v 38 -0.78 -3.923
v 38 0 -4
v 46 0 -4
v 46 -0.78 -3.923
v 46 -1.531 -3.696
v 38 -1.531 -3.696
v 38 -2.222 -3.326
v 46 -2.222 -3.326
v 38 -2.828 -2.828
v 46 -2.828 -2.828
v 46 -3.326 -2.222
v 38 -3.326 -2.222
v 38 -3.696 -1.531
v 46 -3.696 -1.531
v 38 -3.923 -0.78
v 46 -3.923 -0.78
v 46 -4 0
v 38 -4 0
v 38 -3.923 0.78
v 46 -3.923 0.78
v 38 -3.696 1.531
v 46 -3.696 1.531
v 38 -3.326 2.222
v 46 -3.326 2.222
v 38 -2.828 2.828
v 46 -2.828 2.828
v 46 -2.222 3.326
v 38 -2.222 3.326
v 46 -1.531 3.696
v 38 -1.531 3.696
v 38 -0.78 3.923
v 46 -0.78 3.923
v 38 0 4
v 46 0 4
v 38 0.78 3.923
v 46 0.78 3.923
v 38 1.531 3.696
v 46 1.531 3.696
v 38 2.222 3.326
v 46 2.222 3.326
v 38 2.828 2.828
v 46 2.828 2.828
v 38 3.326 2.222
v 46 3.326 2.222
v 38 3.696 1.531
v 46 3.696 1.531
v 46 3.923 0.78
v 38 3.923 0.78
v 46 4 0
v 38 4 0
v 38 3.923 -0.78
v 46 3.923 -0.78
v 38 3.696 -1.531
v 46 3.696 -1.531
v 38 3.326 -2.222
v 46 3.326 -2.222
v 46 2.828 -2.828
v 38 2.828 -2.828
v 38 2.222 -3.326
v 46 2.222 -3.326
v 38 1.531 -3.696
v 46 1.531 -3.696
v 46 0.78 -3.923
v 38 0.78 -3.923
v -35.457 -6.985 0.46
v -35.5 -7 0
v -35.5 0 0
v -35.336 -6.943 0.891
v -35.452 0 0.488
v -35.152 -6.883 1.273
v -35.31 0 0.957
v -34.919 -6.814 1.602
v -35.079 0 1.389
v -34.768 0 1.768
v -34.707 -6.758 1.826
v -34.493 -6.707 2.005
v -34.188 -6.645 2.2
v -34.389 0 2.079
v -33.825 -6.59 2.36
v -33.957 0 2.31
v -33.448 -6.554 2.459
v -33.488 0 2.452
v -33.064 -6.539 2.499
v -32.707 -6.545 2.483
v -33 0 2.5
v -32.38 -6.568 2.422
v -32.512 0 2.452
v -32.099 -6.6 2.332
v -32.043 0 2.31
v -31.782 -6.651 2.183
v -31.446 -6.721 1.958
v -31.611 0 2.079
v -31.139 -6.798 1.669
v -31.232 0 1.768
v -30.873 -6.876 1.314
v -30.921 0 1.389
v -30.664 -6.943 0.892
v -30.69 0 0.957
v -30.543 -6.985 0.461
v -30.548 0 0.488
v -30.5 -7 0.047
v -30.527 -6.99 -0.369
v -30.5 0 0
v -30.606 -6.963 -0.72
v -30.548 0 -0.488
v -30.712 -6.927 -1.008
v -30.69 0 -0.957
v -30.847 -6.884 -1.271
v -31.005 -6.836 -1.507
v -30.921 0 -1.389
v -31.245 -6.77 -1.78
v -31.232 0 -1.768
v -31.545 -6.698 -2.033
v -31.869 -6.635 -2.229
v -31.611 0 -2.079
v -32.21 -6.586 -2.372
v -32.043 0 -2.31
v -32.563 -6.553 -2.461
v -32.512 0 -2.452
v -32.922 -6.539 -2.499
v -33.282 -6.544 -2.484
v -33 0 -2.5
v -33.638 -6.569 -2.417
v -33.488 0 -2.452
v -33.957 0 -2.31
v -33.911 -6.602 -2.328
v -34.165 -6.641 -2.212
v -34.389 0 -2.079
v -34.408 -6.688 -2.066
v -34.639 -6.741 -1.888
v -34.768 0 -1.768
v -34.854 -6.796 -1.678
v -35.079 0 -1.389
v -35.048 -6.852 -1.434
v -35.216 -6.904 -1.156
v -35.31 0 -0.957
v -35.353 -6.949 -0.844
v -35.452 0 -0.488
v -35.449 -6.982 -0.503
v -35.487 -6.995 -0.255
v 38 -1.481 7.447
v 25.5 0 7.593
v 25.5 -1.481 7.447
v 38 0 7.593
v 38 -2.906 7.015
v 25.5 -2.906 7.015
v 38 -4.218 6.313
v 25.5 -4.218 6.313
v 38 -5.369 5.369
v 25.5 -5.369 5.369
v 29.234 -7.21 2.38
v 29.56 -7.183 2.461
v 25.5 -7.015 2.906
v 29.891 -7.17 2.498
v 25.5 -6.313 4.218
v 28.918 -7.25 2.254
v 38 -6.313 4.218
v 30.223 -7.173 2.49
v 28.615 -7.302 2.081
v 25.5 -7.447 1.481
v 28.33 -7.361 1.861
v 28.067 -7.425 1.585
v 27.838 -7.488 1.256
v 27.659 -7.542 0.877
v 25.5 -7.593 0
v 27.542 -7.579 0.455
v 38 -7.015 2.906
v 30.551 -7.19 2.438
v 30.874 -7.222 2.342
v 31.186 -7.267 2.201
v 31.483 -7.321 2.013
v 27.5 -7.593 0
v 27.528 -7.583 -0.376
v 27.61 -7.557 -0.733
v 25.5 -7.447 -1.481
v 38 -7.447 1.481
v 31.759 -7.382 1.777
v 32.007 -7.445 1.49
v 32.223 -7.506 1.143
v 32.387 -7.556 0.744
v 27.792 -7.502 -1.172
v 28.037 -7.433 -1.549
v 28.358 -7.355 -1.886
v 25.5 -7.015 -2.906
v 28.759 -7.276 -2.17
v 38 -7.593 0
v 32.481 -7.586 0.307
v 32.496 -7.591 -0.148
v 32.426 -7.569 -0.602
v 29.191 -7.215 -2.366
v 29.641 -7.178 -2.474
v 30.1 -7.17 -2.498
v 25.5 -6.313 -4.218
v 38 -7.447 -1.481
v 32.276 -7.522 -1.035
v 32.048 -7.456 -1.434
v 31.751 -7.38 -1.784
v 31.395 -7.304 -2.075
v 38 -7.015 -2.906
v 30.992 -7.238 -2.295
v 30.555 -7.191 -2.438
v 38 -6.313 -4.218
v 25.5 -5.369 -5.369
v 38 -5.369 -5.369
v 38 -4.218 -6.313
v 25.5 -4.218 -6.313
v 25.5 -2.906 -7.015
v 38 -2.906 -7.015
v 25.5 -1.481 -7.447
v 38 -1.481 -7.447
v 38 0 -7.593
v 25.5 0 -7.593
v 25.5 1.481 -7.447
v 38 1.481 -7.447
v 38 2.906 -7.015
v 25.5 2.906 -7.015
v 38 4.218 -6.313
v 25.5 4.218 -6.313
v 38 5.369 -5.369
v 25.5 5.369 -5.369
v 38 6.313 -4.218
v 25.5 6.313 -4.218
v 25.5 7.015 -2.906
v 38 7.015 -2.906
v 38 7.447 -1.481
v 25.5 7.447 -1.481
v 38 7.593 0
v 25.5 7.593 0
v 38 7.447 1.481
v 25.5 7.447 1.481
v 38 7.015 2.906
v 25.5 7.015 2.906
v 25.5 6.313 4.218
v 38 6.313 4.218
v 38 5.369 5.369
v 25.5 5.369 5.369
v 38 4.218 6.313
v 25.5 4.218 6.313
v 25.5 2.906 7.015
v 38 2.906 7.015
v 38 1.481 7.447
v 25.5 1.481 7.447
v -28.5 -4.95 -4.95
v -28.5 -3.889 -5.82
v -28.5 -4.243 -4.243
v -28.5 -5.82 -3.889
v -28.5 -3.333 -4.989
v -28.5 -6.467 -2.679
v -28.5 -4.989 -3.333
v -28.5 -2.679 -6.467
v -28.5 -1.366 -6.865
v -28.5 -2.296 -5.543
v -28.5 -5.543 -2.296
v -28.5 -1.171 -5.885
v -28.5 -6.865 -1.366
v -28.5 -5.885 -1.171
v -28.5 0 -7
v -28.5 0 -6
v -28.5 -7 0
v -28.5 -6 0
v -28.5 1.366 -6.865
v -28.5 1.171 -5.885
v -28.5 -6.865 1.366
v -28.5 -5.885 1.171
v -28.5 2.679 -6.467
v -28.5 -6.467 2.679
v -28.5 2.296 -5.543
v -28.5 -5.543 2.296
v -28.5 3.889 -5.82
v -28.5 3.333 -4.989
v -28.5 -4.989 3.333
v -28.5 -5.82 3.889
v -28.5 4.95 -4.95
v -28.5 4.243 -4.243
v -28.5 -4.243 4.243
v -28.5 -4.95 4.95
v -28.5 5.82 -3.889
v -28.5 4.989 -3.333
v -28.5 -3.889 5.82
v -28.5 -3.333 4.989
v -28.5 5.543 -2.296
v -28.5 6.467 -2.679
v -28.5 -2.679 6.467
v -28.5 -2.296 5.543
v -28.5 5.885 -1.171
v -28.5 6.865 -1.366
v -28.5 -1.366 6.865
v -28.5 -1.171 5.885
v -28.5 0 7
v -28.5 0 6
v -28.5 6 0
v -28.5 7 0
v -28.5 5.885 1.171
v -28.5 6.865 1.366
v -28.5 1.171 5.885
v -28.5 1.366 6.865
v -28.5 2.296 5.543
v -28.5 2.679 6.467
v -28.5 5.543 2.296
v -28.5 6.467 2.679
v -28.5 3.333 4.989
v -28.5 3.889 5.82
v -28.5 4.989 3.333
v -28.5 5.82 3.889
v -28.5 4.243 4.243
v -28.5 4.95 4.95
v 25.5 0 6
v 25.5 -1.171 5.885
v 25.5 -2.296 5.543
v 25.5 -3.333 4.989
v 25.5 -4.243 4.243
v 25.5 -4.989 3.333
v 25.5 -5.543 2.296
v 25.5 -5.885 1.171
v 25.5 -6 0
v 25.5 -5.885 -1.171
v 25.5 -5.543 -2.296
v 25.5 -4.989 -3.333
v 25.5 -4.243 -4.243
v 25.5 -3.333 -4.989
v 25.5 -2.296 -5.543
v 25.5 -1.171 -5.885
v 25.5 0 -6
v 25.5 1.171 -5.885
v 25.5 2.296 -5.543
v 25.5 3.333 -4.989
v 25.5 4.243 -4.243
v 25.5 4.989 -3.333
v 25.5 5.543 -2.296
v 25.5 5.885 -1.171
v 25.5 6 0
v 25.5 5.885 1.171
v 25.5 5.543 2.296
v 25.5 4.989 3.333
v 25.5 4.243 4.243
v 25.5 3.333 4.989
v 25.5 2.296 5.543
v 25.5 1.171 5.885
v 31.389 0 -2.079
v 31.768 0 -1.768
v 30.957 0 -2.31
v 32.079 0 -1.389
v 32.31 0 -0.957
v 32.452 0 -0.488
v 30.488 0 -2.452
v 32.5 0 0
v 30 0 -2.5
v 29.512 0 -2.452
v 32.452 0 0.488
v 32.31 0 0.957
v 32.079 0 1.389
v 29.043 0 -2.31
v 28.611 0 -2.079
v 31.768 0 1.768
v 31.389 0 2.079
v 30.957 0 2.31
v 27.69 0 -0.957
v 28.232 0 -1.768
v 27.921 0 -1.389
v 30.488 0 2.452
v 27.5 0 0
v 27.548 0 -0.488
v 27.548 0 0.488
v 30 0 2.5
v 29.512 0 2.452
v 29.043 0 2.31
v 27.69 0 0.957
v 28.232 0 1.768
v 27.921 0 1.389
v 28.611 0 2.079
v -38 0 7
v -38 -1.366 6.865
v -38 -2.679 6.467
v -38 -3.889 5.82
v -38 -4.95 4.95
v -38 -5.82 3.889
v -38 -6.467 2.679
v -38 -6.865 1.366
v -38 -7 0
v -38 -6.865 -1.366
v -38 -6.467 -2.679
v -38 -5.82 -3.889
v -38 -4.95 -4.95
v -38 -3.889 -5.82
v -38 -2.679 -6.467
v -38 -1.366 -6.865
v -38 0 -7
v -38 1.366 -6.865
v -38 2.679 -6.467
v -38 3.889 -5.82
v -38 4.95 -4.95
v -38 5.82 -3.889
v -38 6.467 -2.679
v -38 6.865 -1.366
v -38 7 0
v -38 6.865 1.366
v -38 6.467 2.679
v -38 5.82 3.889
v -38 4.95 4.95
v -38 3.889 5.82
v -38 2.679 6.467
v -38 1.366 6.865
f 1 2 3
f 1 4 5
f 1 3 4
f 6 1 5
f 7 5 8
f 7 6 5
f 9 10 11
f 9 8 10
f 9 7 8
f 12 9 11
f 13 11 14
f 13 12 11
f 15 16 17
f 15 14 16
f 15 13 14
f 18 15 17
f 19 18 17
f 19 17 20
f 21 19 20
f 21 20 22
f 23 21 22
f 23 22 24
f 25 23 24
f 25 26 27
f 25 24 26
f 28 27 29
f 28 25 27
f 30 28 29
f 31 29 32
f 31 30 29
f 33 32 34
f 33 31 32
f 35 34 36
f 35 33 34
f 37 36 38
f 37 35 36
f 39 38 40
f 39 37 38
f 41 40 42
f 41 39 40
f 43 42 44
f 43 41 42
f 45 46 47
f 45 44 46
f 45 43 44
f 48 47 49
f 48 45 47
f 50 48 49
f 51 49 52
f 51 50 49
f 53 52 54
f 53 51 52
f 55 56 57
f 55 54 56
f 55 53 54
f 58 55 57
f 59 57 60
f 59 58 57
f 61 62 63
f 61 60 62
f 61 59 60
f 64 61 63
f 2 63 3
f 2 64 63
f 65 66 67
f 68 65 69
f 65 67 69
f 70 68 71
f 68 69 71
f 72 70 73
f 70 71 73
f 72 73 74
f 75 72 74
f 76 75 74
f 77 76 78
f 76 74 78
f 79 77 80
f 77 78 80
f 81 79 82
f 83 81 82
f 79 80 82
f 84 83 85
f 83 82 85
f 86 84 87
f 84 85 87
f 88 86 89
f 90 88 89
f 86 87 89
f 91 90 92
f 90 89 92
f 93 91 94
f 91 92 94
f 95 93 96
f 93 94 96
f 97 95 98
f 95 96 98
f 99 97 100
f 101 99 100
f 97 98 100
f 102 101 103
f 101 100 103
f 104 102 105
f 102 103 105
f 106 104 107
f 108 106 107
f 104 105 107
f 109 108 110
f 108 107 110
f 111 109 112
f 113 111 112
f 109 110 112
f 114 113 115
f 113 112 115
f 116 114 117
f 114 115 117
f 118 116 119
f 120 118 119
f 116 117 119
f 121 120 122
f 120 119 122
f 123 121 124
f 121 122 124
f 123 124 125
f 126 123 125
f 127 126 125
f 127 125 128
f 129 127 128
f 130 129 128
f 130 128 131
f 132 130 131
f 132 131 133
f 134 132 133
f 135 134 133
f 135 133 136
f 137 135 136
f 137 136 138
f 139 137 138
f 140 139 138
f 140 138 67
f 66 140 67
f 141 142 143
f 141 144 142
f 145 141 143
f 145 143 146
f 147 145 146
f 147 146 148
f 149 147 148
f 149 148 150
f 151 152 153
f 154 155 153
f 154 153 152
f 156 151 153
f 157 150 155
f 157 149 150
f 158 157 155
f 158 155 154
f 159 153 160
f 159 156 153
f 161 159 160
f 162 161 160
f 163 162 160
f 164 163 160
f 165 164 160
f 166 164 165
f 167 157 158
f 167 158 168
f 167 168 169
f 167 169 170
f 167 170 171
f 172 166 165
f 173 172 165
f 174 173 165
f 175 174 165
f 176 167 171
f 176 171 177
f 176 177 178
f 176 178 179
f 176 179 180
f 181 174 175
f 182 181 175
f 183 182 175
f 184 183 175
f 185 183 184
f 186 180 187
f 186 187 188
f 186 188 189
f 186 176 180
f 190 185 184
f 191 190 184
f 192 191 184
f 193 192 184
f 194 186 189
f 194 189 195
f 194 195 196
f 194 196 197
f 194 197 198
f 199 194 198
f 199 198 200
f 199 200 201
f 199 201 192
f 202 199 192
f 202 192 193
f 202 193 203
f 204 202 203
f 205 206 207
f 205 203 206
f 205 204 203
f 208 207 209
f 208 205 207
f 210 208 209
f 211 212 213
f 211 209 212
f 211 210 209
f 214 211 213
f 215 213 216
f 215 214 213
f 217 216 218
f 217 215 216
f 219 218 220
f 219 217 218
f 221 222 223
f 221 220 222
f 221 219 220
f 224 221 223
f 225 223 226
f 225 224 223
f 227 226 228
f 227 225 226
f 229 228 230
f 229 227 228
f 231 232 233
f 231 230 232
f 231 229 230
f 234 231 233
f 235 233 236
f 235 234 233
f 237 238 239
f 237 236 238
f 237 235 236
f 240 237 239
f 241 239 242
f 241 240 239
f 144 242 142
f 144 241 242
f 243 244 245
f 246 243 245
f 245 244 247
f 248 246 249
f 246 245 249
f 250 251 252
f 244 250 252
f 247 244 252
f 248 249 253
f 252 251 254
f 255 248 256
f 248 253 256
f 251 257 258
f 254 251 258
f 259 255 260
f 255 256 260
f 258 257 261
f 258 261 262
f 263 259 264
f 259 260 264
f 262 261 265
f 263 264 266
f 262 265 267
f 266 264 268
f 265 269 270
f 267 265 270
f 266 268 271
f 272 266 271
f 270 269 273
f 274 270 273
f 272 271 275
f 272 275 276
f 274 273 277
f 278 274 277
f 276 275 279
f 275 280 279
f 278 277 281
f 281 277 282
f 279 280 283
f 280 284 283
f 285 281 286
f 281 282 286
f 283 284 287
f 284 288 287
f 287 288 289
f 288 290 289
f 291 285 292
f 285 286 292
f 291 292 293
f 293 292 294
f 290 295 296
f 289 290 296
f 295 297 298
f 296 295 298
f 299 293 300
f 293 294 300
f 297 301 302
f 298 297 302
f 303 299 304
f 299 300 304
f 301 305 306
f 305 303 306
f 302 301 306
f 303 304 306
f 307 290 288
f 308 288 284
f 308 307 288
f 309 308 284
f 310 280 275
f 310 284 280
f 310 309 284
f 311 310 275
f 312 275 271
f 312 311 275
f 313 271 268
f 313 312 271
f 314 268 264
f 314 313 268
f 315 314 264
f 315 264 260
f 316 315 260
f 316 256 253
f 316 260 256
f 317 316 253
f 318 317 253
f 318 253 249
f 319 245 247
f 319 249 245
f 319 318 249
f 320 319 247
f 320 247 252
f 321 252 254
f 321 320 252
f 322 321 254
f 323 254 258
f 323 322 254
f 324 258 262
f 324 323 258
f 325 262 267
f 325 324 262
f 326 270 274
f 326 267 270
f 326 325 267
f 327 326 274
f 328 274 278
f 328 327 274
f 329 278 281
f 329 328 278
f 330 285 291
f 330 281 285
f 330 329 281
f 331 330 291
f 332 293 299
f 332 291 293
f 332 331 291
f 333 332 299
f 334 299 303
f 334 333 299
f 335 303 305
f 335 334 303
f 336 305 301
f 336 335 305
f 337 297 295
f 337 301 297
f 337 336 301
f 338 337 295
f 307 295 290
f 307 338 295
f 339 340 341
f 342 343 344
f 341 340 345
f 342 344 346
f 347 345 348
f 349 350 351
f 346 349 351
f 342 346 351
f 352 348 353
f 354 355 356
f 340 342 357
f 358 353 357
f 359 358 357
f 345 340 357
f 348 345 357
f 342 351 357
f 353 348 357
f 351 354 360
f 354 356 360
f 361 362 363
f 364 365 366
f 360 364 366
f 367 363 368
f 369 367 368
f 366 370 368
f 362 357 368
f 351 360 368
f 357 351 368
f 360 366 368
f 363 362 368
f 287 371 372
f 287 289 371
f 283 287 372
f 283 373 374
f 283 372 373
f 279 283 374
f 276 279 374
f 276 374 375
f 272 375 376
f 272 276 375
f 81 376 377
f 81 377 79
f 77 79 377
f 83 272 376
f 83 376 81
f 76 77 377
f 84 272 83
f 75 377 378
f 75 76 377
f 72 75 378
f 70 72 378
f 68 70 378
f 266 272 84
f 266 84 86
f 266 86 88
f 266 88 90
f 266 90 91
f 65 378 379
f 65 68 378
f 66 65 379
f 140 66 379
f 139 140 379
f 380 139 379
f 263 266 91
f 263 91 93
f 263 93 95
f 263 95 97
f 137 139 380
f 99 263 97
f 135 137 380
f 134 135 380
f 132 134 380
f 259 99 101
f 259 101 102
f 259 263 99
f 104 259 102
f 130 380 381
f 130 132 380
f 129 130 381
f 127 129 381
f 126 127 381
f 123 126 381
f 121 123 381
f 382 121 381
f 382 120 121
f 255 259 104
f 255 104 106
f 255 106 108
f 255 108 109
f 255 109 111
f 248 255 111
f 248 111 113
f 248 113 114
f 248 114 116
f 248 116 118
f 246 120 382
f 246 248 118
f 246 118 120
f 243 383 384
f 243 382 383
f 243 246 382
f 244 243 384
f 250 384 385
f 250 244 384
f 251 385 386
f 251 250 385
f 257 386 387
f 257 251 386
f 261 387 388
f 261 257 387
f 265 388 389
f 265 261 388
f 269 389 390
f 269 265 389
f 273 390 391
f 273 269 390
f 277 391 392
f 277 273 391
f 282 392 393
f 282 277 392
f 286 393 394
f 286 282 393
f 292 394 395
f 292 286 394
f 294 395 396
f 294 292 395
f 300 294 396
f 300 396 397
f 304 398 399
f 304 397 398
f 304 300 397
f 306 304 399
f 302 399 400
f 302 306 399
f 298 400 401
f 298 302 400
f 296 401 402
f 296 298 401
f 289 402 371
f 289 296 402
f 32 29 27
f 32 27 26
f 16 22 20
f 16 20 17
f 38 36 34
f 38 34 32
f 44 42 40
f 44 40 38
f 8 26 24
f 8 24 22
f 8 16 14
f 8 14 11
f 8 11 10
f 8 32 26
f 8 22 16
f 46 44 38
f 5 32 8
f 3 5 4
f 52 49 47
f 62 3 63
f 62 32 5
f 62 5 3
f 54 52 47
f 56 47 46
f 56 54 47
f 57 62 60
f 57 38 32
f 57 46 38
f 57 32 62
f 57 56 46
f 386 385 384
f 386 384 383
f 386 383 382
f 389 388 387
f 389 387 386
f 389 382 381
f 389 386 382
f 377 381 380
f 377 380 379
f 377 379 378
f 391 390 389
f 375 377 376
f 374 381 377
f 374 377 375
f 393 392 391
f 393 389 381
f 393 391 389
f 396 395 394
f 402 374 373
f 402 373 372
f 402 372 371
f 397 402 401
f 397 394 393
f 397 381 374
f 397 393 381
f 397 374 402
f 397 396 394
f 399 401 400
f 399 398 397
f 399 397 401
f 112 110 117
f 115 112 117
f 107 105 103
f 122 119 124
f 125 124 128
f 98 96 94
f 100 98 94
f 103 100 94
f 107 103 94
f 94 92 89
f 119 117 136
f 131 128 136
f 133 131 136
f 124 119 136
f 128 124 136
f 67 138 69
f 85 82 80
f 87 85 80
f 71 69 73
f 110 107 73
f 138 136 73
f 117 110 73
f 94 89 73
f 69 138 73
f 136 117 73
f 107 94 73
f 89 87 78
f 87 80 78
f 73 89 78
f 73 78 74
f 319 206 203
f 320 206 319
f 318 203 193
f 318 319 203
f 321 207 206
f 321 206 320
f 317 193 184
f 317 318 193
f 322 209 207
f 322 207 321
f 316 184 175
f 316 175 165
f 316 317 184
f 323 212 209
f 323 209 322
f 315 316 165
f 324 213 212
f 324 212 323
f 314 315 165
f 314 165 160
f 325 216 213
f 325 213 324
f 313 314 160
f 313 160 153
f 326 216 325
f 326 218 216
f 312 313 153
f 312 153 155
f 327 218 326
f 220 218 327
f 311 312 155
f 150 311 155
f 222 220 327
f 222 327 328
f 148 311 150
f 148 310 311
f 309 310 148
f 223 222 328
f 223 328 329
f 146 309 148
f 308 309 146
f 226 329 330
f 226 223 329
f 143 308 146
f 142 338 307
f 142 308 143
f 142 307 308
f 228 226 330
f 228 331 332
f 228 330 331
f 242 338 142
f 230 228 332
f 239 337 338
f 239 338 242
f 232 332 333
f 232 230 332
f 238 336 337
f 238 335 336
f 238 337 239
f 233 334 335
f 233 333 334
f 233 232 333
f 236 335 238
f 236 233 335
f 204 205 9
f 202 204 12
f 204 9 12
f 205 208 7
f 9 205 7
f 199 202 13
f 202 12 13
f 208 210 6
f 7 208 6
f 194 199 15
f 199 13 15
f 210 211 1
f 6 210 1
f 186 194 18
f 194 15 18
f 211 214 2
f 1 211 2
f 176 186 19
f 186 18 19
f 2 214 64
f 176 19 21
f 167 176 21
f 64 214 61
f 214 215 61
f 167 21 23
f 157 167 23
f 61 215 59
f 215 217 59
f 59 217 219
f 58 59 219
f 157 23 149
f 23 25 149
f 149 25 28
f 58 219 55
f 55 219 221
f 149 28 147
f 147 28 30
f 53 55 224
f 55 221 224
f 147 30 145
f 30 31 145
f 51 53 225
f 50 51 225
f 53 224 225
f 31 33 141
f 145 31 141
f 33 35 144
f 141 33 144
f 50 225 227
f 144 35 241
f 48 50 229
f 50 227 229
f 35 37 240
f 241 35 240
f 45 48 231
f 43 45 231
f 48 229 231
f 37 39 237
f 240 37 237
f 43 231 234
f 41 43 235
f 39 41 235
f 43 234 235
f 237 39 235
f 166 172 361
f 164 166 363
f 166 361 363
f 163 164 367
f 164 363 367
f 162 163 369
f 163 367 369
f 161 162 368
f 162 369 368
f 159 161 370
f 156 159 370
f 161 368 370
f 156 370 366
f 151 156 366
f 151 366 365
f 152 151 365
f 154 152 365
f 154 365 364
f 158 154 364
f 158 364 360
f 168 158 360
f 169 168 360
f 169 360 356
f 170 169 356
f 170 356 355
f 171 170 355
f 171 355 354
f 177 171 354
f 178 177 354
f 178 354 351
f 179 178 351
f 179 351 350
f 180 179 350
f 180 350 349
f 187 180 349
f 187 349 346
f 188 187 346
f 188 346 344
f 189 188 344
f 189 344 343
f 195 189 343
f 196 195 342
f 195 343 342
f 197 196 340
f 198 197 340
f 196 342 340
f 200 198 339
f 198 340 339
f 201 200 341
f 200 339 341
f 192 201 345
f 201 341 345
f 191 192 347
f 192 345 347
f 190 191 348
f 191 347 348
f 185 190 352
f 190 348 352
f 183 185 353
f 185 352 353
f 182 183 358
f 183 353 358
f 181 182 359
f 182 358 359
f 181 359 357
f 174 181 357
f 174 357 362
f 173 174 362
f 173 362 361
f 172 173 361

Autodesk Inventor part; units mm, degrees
ref_plane "YZ Plane" through (0, 0, 0) normal (1, 0, 0) x (0, 1, 0)
ref_plane "XZ Plane" through (0, 0, 0) normal (0, 1, 0) x (-1, 0, 0)
ref_plane "XY Plane" through (0, 0, 0) normal (0, 0, 1) x (1, 0, 0)
sketch "Sketch1" plane through (0, 0, 0) normal (0, 1, 0) x (-1, 0, 0)
  line L0 (-38, 0) -> (38, 0)
  line L1 (38, 0) -> (38, 7)
  line L2 (38, 7) -> (28.5, 7)
  line L3 (28.5, 7) -> (28.5, 6)
  line L4 (28.5, 6) -> (-25.5, 6)
  line L5 (-38, 7.5926) -> (-38, 0)
  line L6 (-25.5, 6) -> (-25.5, 7.5926)
  line L7 (-25.5, 7.5926) -> (-38, 7.5926)
  point P0 (0, 0)
  point P1 (0, 0)
  dimension "d0" = 76
  dimension "d1" = 9.5
  dimension "d3" = 12.5
  dimension "d4" = 14
  dimension "d5" = 12
revolve "Revolution1" add sketch "Sketch1" angle 360 about axis through (38, 0, 0) along (-1, 0, 0)
sketch "Sketch2" plane through (0, 0, 0) normal (0, 1, 0) x (-1, 0, 0)
  line L0 (-38, -7.5926) -> (-38, 7.5926) projected
  line L1 (38, -7) -> (38, 7) projected
  line L2 (-38, 0) -> (38, 0) construction
  circle A0 centre (-30, 0) radius 2.5
  circle A1 centre (33, 0) radius 2.5
  point P0 (0, 0)
  dimension "d7" = 8
  dimension "d8" = 5
  dimension "d9" = 5
  dimension "d10" = 5
extrude "Extrusion1" cut sketch "Sketch2" against normal through all
sketch "Sketch3" plane through (38, 0, 0) normal (1, 0, 0) x (0, 0, -1)
  circle A0 centre (0, 0) radius 4
  dimension "d13" = 8
extrude "Extrusion2" add sketch "Sketch3" along normal blind 8
equation "\"d0\" = parS + stroke"
equation "\"d1\" = parNB"
equation "\"d3\" = parNA"
equation "\"d4\" = parC"
equation "\"d5\" = parB"
equation "\"d7\" = parGA"
equation "\"d8\" = parGB"
equation "\"parA\" = 15"
equation "\"parB\" = 12"
equation "\"parC\" = 14"
equation "\"parD\" = 4"
equation "\"parF\" = 8"
equation "\"parGA\" = 8"
equation "\"parGB\" = 5"
equation "\"parH\" = 28"
equation "\"parMM\" = 4"
equation "\"parNA\" = 12.5"
equation "\"parNB\" = 9.5"
equation "\"Ndh8\" = 8"
equation "\"parNN\" = 8"
equation "\"parS\" = 46"
equation "\"parZ\" = 74"
equation "\"stroke\" = 30"
properties part number "30mmCylinder"
